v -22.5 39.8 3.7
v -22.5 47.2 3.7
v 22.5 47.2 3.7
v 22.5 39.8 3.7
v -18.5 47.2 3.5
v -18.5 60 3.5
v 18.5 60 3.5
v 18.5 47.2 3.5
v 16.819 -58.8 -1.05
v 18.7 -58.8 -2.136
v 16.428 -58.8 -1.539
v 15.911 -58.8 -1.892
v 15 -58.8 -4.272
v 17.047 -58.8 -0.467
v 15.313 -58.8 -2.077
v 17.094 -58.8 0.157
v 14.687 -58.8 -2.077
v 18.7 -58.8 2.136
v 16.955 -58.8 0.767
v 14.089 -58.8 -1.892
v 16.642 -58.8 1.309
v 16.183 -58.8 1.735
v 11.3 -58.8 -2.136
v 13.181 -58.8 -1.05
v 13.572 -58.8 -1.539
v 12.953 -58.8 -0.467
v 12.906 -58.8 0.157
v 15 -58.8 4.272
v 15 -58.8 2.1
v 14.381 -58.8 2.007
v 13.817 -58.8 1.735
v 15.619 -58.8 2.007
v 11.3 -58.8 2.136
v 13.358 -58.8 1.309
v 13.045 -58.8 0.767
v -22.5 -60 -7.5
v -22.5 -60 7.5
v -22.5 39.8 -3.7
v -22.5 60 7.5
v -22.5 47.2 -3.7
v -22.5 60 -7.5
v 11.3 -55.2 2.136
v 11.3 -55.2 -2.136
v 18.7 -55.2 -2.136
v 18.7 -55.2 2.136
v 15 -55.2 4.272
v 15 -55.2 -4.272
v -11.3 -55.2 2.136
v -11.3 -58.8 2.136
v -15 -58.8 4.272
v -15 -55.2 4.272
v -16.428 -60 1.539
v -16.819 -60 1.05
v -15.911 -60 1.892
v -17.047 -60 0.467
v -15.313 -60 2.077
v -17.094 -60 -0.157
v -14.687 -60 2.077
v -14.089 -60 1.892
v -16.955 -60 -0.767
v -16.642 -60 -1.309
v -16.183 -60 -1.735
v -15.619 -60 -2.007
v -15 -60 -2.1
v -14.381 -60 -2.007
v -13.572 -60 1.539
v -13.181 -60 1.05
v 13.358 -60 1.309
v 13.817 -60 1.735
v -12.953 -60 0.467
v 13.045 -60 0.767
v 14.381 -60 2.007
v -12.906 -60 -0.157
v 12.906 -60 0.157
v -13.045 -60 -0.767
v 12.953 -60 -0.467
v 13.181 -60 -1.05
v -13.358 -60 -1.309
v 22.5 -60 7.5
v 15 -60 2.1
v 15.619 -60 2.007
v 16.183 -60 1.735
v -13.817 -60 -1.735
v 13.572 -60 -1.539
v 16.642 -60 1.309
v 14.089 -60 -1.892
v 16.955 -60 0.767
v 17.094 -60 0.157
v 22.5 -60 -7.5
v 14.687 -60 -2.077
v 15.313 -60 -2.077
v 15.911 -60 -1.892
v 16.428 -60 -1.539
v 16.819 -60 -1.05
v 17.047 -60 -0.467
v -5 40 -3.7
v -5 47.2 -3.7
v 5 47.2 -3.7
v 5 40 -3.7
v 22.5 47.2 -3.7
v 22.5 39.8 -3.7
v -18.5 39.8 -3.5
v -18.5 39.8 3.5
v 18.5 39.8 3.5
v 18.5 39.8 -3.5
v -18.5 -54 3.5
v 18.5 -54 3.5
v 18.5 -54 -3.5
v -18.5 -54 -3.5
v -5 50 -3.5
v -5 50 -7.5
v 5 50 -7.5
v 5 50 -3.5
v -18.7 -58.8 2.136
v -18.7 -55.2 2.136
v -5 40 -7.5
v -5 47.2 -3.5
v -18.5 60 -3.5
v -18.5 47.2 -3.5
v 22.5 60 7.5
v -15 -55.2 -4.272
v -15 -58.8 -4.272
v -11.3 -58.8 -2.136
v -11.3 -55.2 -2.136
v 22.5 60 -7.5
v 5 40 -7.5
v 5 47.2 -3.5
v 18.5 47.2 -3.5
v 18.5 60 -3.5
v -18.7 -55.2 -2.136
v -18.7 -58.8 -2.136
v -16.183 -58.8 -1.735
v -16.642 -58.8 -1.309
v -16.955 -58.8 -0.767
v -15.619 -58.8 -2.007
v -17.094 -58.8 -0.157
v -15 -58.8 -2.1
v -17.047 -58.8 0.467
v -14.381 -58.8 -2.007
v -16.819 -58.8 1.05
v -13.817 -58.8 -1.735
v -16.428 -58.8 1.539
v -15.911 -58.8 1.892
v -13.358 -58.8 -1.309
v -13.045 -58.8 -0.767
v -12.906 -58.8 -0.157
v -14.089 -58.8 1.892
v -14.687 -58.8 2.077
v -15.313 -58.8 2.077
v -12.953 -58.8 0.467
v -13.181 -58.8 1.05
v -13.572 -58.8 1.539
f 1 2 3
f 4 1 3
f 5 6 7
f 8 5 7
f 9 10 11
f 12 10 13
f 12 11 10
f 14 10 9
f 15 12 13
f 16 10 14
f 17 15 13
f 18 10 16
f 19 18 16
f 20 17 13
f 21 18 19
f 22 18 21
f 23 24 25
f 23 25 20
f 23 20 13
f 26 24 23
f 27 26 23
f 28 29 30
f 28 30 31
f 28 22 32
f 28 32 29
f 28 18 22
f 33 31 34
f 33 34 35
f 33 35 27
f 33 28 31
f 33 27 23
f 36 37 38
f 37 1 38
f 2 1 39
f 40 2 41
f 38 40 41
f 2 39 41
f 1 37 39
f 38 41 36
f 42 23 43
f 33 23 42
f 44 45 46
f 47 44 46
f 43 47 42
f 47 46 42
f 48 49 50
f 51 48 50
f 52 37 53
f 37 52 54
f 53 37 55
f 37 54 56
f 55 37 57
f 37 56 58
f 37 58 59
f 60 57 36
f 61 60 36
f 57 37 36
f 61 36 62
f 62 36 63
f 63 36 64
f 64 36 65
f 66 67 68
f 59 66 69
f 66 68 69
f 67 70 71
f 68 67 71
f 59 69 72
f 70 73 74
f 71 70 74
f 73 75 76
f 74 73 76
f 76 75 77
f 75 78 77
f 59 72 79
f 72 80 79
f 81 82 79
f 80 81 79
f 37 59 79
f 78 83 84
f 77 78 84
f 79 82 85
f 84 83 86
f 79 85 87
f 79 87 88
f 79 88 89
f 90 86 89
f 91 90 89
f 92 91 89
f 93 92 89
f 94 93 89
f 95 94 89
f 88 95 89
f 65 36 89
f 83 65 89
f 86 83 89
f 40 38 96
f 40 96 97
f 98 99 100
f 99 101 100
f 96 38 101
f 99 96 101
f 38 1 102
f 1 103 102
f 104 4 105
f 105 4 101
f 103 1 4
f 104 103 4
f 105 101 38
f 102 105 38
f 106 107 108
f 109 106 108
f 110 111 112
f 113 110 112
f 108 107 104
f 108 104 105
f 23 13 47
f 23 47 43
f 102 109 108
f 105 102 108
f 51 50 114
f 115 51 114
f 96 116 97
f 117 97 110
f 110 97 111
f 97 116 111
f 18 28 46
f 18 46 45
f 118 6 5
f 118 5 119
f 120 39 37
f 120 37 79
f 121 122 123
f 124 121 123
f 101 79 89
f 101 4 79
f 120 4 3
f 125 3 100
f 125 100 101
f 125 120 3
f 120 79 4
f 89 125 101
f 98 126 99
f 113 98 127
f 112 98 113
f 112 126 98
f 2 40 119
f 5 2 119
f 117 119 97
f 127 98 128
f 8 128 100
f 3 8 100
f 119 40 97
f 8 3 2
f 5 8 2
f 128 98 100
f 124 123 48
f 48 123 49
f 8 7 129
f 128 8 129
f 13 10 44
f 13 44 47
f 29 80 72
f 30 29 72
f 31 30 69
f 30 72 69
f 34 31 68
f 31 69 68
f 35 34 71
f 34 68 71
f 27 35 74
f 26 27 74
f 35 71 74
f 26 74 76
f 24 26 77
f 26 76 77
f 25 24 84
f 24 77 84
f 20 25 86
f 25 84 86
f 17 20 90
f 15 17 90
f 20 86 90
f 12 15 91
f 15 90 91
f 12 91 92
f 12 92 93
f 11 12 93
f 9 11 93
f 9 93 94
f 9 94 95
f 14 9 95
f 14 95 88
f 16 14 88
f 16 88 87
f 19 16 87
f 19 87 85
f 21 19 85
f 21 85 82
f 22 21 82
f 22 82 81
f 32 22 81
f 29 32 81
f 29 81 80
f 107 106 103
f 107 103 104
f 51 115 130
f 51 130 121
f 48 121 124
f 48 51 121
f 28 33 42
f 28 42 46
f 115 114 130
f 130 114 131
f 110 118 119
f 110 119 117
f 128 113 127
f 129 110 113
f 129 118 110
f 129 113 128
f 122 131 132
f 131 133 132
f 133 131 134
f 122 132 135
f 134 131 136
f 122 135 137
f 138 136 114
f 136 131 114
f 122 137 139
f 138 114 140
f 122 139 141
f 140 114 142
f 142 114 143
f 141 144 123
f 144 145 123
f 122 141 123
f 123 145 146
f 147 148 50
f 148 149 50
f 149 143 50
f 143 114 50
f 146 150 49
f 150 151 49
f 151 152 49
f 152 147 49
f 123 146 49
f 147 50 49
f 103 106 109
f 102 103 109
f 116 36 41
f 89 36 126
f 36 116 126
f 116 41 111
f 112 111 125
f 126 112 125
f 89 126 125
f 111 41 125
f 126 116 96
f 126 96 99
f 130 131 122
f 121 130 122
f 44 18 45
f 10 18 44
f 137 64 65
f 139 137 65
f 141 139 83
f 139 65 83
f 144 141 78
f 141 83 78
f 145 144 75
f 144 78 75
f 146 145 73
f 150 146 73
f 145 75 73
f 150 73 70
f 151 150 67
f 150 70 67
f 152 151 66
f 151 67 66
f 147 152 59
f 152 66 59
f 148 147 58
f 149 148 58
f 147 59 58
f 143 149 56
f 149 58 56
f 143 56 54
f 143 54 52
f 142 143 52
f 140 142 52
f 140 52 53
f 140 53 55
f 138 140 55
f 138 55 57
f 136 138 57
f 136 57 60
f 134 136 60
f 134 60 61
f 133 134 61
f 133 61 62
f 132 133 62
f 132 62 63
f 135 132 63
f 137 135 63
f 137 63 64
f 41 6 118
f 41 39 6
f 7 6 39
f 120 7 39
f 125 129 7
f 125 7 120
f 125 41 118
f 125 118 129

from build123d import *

# Parameters (mm, degrees)
SKETCH1_W                   = 45
SKETCH1_H                   = 15
BOSS_EXTRUDE1_DEPTH         = 60
SHELL1_T                    = -4
SHELL1_THICKNESS_2_FACE_W   = 7
SHELL1_THICKNESS_2_FACE_H   = 37
SHELL1_THICKNESS_2_DEPTH    = 2
CUT_EXTRUDE3_REACH          = 67.812
SKETCH4_W                   = 10
SKETCH4_H                   = 10
SKETCH5_W                   = 7.4
SKETCH5_H                   = 7.4
CUT_EXTRUDE4_DEPTH          = 76.374067158
CUT_EXTRUDE5_START          = -1.2
CUT_EXTRUDE5_DEPTH          = 3.6
CUT_EXTRUDE6_REACH          = 124.321
SKETCH7_R                   = 2.1
BODY_MOVE_COPY1_START       = -7.5
BODY_MOVE_COPY1_OUTLINE_W   = 10
BODY_MOVE_COPY1_OUTLINE_H   = 10
BODY_MOVE_COPY1_DEPTH       = 4
BODY_MOVE_COPY1_START_2     = 3.7
BODY_MOVE_COPY1_2_OUTLINE_W = 10
BODY_MOVE_COPY1_2_OUTLINE_H = 10
BODY_MOVE_COPY1_2_DEPTH     = 3.8
BODY_MOVE_COPY1_START_3     = 3.5
BODY_MOVE_COPY1_3_OUTLINE_W = 10
BODY_MOVE_COPY1_3_OUTLINE_H = 2.8
BODY_MOVE_COPY1_3_DEPTH     = 0.2


# Read off the part's stored shape, not the designer's step: Body-Move/Copy1
with BuildPart() as part:
    # Sketch1 → Boss-Extrude1 (new, symmetric)
    with BuildSketch(Plane(origin=(0, 0, 0), x_dir=(1, 0, 0), z_dir=(0, 1, 0))):
        Rectangle(SKETCH1_W, SKETCH1_H)
    extrude(amount=BOSS_EXTRUDE1_DEPTH, both=True)

    # Shell1
    shell1_openings = [part.faces().sort_by_distance(p)[0] for p in [
        (0, 60, 0),
    ]]
    offset(amount=SHELL1_T, openings=shell1_openings, kind=Kind.INTERSECTION)

    # Shell1 thickness 2 face (on inner face of the shell) → Shell1 thickness 2 (add)
    with BuildSketch(Plane(origin=(0, -56, 0), x_dir=(0, 0, -1), z_dir=(0, -1, 0))):
        Rectangle(SHELL1_THICKNESS_2_FACE_W, SHELL1_THICKNESS_2_FACE_H)
    extrude(amount=-SHELL1_THICKNESS_2_DEPTH)

    # Sketch4 → Cut-Extrude3 (cut, up to next)
    with BuildSketch(Plane.XY.offset(7.5), mode=Mode.PRIVATE) as cut_extrude3_sk1:
        with Locations((0, 45)):
            Rectangle(SKETCH4_W, SKETCH4_H)
    cut_extrude3_tool1 = extrude(cut_extrude3_sk1.sketch, amount=-CUT_EXTRUDE3_REACH, mode=Mode.PRIVATE) & part.part
    add(cut_extrude3_tool1.solids().sort_by_distance((0, 45, 7.5))[0], mode=Mode.SUBTRACT)

    # Sketch5 → Cut-Extrude4 (cut, through all)
    with BuildSketch(Plane(origin=(22.5, 0, 0), x_dir=(0, 0, -1), z_dir=(1, 0, 0))):
        with Locations((0, 43.5)):
            Rectangle(SKETCH5_W, SKETCH5_H)
    extrude(amount=-CUT_EXTRUDE4_DEPTH, mode=Mode.SUBTRACT)

    # Sketch6 → Cut-Extrude5 (cut)
    with BuildSketch(Plane.XZ.offset(60).offset(CUT_EXTRUDE5_START)):
        Polygon((-15, 4.272391992), (-18.7, 2.136195996), (-18.7, -2.136195996), (-15, -4.272391992), (-11.3, -2.136195996), (-11.3, 2.136195996), align=None)
        Polygon((11.3, 2.136195996), (15, 4.272391992), (18.7, 2.136195996), (18.7, -2.136195996), (15, -4.272391992), (11.3, -2.136195996), align=None)
    extrude(amount=-CUT_EXTRUDE5_DEPTH, mode=Mode.SUBTRACT)

    # Sketch7 → Cut-Extrude6 (cut, up to next)
    with BuildSketch(Plane.XZ.offset(60), mode=Mode.PRIVATE) as cut_extrude6_sk1:
        with Locations(Location((-15, 0, 0), (0, 0, 270))):
            Circle(SKETCH7_R)
    cut_extrude6_tool1 = extrude(cut_extrude6_sk1.sketch, amount=-CUT_EXTRUDE6_REACH, mode=Mode.PRIVATE) & part.part
    # Sketch7 → Cut-Extrude6 (cut, up to next)
    with BuildSketch(Plane.XZ.offset(60), mode=Mode.PRIVATE) as cut_extrude6_sk2:
        with Locations(Location((15, 0, 0), (0, 0, 90))):
            Circle(SKETCH7_R)
    cut_extrude6_tool2 = extrude(cut_extrude6_sk2.sketch, amount=-CUT_EXTRUDE6_REACH, mode=Mode.PRIVATE) & part.part
    add(cut_extrude6_tool1.solids().sort_by_distance((-15, -60, 0))[0], mode=Mode.SUBTRACT)
    add(cut_extrude6_tool2.solids().sort_by_distance((15, -60, 0))[0], mode=Mode.SUBTRACT)

    # Body-Move/Copy1 outline → Body-Move/Copy1 (cut)
    with BuildSketch(Plane.XY.offset(BODY_MOVE_COPY1_START)):
        with Locations((0, 45)):
            Rectangle(BODY_MOVE_COPY1_OUTLINE_W, BODY_MOVE_COPY1_OUTLINE_H)
    extrude(amount=BODY_MOVE_COPY1_DEPTH, mode=Mode.SUBTRACT)

    # Body-Move_Copy1 2 outline → Body-Move_Copy1 2 (add)
    with BuildSketch(Plane.XY.offset(BODY_MOVE_COPY1_START_2)):
        with Locations((0, 45)):
            Rectangle(BODY_MOVE_COPY1_2_OUTLINE_W, BODY_MOVE_COPY1_2_OUTLINE_H)
    extrude(amount=BODY_MOVE_COPY1_2_DEPTH)

    # Body-Move_Copy1 3 outline → Body-Move_Copy1 3 (add)
    with BuildSketch(Plane.XY.offset(BODY_MOVE_COPY1_START_3)):
        with Locations((0, 48.6)):
            Rectangle(BODY_MOVE_COPY1_3_OUTLINE_W, BODY_MOVE_COPY1_3_OUTLINE_H)
    extrude(amount=BODY_MOVE_COPY1_3_DEPTH)


solid = part.part
